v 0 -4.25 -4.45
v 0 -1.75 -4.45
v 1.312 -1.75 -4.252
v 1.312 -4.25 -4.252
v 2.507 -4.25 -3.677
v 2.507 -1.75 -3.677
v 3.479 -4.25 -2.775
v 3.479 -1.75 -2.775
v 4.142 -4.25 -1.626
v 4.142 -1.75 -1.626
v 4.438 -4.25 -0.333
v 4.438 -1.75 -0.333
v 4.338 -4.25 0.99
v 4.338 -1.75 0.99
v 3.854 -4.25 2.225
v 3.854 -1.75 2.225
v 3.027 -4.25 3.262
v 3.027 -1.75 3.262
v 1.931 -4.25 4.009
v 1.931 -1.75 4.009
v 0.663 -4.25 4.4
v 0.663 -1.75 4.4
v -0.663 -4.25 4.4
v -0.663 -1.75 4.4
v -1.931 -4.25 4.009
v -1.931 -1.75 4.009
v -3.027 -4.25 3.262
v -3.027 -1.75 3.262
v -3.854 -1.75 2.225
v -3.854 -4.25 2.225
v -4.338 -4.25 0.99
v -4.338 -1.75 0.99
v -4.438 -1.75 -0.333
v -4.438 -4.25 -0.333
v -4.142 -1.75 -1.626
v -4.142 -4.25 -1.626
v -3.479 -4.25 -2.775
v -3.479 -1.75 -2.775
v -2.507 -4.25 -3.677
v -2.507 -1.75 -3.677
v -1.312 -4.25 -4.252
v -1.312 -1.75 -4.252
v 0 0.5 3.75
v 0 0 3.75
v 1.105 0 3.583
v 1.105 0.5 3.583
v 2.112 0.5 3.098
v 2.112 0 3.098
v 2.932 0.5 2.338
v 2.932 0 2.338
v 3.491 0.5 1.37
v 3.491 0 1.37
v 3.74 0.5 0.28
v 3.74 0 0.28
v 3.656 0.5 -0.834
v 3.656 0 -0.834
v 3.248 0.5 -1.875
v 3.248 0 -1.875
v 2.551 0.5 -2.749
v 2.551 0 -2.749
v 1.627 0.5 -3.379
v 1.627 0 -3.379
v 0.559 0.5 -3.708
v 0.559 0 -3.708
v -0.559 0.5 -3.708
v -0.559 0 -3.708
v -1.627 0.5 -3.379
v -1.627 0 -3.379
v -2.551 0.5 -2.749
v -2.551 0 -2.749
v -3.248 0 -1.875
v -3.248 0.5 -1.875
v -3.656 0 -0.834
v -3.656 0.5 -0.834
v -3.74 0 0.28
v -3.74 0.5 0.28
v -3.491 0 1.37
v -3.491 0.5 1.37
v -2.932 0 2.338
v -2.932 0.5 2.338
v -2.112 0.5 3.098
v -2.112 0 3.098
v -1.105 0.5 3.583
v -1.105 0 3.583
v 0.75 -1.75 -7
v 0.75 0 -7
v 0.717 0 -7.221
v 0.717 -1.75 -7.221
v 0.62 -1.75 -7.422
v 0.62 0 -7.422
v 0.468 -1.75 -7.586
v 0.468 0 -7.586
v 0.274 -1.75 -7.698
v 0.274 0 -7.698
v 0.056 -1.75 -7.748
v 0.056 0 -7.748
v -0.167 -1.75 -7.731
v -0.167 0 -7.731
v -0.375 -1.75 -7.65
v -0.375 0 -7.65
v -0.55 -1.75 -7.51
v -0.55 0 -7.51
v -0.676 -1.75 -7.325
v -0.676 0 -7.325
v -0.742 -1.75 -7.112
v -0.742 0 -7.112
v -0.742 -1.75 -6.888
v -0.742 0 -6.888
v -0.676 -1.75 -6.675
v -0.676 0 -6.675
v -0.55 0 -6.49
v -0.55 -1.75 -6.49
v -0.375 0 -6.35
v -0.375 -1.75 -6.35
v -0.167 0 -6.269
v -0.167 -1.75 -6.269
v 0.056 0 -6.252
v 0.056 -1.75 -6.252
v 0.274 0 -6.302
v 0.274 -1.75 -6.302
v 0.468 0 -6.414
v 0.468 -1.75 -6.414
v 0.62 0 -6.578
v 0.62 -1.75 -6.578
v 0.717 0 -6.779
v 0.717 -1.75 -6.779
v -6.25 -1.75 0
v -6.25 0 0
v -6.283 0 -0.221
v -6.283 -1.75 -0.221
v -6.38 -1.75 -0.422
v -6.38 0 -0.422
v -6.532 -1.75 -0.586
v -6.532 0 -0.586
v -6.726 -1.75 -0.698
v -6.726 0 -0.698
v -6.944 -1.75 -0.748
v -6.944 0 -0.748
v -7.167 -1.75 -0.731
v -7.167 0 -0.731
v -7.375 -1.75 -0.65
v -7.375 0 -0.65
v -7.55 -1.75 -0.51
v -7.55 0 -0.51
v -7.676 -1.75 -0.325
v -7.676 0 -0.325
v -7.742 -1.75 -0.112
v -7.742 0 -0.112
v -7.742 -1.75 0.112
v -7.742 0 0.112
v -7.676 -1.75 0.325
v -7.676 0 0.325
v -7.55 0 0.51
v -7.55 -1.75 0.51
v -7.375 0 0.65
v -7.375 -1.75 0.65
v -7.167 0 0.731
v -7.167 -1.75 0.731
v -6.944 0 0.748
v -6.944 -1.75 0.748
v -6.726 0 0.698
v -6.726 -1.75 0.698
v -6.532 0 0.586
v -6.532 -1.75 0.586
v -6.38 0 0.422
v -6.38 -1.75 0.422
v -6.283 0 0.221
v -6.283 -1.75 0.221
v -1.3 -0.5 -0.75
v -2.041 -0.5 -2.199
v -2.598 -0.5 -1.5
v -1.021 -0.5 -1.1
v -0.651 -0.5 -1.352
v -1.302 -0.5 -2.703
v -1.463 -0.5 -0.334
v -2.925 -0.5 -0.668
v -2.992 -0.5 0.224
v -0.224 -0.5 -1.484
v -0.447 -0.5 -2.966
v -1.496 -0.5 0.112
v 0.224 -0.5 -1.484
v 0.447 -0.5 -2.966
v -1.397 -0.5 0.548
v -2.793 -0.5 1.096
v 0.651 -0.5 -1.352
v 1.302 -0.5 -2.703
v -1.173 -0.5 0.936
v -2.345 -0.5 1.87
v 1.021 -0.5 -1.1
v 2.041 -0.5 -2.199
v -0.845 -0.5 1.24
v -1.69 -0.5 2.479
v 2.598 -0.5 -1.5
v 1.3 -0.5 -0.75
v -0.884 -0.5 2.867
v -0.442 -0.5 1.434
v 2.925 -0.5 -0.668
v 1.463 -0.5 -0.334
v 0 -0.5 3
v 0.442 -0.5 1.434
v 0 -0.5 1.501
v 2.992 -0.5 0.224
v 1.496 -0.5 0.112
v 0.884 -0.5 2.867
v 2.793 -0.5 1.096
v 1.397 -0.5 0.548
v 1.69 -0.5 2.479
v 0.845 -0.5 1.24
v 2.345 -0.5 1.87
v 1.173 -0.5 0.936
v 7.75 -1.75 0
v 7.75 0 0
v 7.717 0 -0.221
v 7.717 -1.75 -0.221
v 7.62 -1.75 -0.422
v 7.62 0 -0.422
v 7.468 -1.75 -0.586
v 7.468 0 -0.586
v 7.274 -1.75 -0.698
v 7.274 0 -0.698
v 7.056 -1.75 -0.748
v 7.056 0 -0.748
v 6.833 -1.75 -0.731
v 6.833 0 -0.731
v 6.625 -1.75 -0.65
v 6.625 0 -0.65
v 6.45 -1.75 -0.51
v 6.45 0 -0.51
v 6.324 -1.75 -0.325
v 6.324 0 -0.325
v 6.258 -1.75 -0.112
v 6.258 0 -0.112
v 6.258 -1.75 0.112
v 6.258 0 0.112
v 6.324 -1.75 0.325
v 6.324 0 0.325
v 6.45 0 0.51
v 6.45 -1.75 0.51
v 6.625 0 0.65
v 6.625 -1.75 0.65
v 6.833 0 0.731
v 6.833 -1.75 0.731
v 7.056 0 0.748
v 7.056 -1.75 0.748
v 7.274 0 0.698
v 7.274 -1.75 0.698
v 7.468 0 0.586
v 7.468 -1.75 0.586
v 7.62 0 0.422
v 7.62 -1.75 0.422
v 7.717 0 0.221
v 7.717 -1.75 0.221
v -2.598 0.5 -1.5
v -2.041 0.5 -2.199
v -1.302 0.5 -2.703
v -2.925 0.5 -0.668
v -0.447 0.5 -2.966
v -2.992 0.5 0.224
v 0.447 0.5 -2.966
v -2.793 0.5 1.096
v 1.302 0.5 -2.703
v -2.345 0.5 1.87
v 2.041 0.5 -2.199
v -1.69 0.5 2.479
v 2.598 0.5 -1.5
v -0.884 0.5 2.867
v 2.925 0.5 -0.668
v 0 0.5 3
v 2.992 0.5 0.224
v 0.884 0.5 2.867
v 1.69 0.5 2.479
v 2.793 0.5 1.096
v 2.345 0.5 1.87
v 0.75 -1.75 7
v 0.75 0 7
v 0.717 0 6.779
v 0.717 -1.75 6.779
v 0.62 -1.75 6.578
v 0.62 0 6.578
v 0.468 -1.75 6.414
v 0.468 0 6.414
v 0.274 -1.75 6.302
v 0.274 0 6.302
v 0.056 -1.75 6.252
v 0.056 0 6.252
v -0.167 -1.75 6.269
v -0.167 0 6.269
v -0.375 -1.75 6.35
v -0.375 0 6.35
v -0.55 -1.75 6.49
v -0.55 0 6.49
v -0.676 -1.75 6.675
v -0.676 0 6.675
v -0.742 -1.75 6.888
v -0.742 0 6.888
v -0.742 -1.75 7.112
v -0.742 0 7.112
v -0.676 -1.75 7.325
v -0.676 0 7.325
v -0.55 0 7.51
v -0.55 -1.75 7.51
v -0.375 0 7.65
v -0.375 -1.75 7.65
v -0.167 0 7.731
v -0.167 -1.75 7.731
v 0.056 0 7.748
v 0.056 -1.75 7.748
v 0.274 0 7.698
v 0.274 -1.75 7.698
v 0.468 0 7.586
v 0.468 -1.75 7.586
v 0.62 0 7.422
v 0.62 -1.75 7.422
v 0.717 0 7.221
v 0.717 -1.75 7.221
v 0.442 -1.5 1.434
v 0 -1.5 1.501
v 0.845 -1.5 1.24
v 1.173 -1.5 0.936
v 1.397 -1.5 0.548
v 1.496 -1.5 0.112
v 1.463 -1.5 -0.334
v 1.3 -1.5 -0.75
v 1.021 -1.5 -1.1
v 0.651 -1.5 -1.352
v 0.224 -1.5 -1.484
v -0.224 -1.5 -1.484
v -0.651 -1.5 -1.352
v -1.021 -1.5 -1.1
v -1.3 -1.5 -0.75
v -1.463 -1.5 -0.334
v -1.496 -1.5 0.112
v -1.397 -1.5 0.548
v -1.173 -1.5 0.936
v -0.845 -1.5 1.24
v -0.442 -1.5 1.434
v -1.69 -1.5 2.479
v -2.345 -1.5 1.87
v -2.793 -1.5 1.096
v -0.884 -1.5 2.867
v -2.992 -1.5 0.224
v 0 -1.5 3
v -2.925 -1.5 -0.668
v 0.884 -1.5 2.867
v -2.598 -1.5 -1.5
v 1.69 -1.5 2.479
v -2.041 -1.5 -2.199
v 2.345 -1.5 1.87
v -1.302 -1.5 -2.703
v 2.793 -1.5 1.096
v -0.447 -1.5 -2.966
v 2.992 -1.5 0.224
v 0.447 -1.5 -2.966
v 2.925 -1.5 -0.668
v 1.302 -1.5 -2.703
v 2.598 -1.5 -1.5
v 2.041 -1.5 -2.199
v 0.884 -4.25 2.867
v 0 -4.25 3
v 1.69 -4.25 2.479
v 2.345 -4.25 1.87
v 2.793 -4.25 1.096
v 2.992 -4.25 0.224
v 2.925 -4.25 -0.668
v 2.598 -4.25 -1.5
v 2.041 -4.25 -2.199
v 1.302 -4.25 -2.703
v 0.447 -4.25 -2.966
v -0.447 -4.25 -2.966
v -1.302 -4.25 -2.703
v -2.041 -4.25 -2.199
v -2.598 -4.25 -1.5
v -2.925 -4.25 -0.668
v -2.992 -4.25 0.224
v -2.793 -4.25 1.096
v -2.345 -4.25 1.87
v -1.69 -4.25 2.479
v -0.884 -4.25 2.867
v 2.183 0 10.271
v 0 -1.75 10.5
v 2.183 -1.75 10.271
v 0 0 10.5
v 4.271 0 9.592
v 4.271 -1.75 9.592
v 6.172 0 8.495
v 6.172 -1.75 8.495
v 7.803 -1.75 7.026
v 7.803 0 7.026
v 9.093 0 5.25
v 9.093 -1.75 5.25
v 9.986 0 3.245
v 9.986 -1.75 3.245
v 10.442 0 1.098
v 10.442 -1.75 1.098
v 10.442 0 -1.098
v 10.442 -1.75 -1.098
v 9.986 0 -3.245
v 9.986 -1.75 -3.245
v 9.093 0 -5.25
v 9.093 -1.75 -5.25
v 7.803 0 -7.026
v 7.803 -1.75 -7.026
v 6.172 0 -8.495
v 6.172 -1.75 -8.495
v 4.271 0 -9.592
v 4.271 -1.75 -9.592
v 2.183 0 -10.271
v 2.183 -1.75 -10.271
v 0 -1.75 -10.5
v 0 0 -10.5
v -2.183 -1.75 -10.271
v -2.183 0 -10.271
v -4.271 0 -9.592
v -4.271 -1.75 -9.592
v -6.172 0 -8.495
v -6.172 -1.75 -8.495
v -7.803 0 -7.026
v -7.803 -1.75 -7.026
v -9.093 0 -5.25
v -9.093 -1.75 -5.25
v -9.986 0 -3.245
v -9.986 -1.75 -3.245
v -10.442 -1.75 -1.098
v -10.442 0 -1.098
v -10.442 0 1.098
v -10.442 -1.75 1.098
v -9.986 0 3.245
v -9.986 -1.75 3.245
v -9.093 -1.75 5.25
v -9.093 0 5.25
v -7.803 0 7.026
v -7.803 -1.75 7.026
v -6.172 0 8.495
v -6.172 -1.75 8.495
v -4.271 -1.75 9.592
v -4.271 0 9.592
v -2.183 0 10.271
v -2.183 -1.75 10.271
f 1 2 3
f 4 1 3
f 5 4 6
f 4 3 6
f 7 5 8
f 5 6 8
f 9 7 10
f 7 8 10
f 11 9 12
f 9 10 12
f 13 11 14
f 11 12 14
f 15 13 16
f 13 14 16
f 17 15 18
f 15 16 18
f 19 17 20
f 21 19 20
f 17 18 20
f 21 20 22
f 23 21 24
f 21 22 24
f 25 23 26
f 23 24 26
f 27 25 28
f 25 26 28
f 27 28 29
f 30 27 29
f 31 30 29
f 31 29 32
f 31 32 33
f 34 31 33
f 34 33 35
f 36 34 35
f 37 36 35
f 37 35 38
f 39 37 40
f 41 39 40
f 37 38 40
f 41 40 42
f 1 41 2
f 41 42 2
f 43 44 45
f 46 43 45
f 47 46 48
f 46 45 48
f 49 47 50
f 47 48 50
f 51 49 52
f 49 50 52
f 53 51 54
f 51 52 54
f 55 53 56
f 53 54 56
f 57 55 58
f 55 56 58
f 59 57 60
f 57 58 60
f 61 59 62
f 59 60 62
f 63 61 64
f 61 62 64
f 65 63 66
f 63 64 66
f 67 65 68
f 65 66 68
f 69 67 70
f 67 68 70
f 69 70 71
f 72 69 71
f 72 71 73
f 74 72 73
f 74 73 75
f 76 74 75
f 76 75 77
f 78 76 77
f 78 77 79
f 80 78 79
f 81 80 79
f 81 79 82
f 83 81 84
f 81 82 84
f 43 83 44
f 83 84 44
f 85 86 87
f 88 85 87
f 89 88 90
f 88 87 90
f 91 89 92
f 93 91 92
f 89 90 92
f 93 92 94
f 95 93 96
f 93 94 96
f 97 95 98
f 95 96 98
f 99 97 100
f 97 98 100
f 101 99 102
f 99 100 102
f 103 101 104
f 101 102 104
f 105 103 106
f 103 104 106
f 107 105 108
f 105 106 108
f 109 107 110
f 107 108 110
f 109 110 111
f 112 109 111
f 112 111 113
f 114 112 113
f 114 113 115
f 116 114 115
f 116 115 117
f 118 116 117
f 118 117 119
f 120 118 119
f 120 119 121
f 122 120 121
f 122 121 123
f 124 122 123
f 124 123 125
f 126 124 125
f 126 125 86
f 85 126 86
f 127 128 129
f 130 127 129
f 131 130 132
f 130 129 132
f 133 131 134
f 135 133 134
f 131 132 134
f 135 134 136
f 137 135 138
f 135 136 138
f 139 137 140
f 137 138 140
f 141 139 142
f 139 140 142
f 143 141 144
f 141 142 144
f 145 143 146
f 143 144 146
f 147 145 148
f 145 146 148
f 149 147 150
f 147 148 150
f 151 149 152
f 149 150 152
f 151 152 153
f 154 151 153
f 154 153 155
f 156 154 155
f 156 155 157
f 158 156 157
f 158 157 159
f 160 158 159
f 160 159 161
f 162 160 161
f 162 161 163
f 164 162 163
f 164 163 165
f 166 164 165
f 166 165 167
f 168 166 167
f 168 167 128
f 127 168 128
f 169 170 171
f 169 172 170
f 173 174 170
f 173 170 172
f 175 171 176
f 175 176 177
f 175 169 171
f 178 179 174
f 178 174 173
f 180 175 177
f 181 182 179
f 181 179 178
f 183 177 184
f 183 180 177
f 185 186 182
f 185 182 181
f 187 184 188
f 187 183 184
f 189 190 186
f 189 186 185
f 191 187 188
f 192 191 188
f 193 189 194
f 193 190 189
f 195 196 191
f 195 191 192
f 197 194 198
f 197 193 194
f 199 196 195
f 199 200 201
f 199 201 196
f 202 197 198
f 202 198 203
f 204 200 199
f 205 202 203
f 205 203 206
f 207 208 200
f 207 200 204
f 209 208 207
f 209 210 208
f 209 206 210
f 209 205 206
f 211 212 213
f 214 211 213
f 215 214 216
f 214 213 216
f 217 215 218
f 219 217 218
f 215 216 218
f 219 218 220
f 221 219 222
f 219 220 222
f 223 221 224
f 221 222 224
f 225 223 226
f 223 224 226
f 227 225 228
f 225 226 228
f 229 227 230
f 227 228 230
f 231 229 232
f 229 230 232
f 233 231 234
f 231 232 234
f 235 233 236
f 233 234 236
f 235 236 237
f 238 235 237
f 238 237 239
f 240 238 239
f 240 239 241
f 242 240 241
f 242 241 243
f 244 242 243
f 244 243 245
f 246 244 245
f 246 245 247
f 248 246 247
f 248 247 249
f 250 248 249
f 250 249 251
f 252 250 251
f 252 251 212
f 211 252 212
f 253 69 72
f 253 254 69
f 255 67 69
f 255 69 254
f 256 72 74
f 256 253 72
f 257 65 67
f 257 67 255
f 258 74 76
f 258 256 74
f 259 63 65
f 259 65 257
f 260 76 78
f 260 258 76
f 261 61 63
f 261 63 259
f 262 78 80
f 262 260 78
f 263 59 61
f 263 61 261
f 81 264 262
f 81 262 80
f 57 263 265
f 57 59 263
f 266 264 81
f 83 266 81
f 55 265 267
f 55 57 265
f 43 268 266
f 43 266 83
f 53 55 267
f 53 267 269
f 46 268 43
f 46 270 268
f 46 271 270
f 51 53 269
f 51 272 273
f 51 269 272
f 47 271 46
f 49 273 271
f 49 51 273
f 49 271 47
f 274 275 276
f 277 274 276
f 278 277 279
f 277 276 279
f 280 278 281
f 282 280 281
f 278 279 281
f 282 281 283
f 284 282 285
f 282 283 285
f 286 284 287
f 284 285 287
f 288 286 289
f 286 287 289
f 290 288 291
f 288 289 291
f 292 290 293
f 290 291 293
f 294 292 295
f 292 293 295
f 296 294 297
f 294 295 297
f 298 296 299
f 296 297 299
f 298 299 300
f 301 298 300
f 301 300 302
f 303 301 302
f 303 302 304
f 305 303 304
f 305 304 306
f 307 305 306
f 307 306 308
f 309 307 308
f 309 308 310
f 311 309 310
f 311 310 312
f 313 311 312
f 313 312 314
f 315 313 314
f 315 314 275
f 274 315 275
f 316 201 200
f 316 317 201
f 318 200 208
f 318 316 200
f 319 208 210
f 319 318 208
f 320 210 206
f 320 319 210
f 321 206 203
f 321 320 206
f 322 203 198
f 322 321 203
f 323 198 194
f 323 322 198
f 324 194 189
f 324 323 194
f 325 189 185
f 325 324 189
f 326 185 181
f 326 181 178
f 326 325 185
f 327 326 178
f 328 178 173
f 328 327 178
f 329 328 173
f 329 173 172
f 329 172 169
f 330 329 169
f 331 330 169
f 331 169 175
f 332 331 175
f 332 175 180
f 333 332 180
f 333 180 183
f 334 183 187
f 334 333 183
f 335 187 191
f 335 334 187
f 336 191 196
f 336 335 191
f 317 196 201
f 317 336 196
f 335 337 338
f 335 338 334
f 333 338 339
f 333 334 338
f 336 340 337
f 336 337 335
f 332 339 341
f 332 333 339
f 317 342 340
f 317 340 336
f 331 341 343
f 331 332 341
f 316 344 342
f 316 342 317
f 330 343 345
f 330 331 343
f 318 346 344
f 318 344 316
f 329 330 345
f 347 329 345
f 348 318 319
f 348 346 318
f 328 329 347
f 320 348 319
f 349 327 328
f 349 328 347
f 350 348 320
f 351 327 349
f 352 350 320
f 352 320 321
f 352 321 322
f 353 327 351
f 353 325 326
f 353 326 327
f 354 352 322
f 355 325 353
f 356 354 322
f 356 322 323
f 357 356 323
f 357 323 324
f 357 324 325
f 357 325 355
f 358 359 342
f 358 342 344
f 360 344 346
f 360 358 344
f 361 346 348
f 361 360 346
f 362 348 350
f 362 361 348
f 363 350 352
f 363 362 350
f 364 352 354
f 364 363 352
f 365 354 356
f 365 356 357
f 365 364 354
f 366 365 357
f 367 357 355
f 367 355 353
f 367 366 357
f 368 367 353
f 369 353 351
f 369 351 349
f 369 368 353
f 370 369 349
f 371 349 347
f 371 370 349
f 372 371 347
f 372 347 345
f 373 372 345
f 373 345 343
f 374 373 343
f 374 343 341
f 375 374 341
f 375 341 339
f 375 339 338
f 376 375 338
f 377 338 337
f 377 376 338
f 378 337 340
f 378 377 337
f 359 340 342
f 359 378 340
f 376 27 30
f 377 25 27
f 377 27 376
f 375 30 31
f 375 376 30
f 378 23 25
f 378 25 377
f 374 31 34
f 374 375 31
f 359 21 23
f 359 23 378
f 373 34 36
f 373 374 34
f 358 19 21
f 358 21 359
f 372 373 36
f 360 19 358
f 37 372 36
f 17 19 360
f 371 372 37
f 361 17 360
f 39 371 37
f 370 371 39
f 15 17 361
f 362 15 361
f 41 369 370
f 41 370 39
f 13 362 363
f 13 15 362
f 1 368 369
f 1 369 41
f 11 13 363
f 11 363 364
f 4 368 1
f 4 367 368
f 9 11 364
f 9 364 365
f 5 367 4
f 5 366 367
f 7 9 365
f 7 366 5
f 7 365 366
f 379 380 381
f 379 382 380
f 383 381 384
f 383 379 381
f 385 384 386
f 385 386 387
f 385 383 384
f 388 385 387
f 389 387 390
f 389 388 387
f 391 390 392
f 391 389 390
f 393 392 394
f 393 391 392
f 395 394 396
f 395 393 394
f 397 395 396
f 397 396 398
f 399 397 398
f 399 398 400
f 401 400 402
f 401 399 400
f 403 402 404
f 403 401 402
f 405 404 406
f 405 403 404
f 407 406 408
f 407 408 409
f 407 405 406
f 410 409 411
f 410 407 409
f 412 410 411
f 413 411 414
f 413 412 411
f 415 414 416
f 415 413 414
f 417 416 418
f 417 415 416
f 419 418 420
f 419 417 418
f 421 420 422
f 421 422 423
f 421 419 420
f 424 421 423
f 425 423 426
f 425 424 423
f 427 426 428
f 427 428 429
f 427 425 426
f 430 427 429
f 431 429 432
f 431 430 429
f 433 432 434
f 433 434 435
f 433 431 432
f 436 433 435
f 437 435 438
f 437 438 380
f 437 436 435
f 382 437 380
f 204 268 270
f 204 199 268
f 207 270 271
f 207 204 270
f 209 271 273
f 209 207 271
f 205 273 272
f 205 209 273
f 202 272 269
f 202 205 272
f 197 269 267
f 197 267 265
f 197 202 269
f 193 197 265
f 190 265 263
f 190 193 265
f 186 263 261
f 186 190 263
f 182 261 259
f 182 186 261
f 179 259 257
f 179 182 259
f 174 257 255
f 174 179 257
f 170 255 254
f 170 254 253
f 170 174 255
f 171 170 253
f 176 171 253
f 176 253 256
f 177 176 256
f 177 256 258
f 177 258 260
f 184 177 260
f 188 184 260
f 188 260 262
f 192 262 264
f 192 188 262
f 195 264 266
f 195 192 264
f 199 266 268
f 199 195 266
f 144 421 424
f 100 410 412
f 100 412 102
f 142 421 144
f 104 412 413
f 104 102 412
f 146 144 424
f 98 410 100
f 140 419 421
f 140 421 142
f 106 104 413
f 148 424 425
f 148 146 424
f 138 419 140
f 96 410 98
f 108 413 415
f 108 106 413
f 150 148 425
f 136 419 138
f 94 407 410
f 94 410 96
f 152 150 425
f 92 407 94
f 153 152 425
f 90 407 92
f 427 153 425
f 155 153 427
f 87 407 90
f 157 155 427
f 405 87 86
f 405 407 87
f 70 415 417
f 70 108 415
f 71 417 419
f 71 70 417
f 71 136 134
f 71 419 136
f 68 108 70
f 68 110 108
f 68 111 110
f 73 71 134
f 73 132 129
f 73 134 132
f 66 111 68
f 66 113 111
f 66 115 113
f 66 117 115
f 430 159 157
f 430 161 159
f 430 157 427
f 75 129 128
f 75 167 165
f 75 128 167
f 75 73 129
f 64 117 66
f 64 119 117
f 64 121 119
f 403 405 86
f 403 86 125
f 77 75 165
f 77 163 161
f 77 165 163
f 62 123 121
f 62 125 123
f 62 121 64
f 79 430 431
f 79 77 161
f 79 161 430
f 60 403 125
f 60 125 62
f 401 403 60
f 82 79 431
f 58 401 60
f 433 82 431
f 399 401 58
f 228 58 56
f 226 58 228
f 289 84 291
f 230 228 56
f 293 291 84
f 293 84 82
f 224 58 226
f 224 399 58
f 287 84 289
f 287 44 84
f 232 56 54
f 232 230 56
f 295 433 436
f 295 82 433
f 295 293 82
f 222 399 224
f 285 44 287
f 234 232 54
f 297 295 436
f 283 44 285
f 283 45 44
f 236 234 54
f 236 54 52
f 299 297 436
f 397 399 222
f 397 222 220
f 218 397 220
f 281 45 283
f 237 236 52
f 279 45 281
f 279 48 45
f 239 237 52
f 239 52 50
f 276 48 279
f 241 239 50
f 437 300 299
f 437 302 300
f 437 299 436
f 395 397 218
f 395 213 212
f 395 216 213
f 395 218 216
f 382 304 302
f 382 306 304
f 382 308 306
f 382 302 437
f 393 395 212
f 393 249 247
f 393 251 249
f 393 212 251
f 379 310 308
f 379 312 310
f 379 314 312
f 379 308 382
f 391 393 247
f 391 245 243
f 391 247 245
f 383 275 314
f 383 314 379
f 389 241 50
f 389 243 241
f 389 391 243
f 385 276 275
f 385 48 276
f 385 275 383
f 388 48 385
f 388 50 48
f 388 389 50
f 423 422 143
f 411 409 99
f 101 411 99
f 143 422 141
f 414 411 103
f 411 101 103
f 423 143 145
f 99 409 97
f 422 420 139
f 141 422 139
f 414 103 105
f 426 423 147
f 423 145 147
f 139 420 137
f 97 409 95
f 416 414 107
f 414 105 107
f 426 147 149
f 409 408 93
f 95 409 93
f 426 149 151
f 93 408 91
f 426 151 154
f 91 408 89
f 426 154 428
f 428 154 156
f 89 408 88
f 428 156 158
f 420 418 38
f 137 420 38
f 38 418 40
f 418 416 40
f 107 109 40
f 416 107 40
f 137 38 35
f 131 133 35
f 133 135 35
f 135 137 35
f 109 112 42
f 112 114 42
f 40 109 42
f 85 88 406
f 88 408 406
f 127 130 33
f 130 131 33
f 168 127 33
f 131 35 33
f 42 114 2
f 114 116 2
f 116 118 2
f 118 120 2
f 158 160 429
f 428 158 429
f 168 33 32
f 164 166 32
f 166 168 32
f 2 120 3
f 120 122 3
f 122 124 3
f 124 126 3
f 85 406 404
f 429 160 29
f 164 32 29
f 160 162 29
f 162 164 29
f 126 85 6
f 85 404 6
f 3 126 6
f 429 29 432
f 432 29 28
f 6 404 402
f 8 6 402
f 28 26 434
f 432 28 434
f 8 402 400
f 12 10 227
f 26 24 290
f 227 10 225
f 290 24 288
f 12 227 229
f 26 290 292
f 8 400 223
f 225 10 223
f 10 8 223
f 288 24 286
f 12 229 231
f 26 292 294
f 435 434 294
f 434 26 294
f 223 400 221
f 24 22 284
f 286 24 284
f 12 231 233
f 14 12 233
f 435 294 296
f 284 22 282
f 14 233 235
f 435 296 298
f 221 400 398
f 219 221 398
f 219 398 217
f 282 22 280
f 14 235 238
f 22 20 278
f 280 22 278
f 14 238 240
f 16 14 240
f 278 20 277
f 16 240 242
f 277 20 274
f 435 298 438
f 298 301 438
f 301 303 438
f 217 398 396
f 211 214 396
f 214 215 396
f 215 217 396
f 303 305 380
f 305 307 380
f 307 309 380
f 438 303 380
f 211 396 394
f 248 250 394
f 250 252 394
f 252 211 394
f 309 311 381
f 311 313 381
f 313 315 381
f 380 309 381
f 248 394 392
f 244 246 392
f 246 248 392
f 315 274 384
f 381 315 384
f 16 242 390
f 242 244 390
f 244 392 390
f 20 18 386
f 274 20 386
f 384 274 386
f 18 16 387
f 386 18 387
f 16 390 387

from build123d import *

# Parameters (mm, degrees)
ESQUISSE1_W                     = 10.5
ESQUISSE1_H                     = 1.75
ESQUISSE2_R                     = 4.45
BOSS_EXTRU_1_DEPTH              = 2.5
ESQUISSE3_R                     = 3.75
BOSS_EXTRU_2_DEPTH              = 0.5
DIAM_TRE_DU_PER_AGE_1_5_1_5_1_D = 1.5


with BuildPart() as part:
    # Esquisse1 → Révolution1 (revolve)
    with BuildSketch(Plane(origin=(0, 0, 0), x_dir=(-1, 0, 0), z_dir=(0, 0, -1)), mode=Mode.PRIVATE) as r_volution1_sk:
        with Locations((-5.25, -0.875)):
            Rectangle(ESQUISSE1_W, ESQUISSE1_H)
    revolve(r_volution1_sk.sketch.rotate(Axis((0, -1.75, 0), (0, 1, 0)), 270), axis=Axis((0, -1.75, 0), (0, 1, 0)))

    # Esquisse2 → Boss.-Extru.1 (add)
    with BuildSketch(Plane.XZ.offset(1.75)):
        with Locations(Location((0, 0, 0), (0, 0, 270))):
            Circle(ESQUISSE2_R)
    extrude(amount=BOSS_EXTRU_1_DEPTH)

    # Esquisse3 → Boss.-Extru.2 (add)
    with BuildSketch(Plane(origin=(0, 0, 0), x_dir=(-1, 0, 0), z_dir=(0, 1, 0))):
        with Locations(Location((0, 0, 0), (0, 0, 90))):
            Circle(ESQUISSE3_R)
    extrude(amount=BOSS_EXTRU_2_DEPTH)

    # Esquisse4 → Enlèvement de matière-Révolution1 (revolve, cut)
    with BuildSketch(Plane(origin=(0, 0, 0), x_dir=(-1, 0, 0), z_dir=(0, 0, -1)), mode=Mode.PRIVATE) as enl_vement_de_mati_re_r_volution1_sk:
        Polygon((-3, -4.5), (0, -4.5), (0, 0.5), (-3, 0.5), (-3, -0.5), (-1.500593113, -0.5), (-1.500593113, -1.5), (-3, -1.5), align=None)
    revolve(enl_vement_de_mati_re_r_volution1_sk.sketch.rotate(Axis((0, -4.5, 0), (0, 1, 0)), 270), axis=Axis((0, -4.5, 0), (0, 1, 0)), mode=Mode.SUBTRACT)

    # Diamètre du perçage Ø1.5 (1.5)1 (through all)
    with Locations(Plane(origin=(0, -1.75, 0), x_dir=(-1, 0, 0), z_dir=(0, -1, 0))):
        with Locations((-7, 0), (0, 7), (7, 0), (0, -7)):
            Hole(DIAM_TRE_DU_PER_AGE_1_5_1_5_1_D / 2)


solid = part.part
